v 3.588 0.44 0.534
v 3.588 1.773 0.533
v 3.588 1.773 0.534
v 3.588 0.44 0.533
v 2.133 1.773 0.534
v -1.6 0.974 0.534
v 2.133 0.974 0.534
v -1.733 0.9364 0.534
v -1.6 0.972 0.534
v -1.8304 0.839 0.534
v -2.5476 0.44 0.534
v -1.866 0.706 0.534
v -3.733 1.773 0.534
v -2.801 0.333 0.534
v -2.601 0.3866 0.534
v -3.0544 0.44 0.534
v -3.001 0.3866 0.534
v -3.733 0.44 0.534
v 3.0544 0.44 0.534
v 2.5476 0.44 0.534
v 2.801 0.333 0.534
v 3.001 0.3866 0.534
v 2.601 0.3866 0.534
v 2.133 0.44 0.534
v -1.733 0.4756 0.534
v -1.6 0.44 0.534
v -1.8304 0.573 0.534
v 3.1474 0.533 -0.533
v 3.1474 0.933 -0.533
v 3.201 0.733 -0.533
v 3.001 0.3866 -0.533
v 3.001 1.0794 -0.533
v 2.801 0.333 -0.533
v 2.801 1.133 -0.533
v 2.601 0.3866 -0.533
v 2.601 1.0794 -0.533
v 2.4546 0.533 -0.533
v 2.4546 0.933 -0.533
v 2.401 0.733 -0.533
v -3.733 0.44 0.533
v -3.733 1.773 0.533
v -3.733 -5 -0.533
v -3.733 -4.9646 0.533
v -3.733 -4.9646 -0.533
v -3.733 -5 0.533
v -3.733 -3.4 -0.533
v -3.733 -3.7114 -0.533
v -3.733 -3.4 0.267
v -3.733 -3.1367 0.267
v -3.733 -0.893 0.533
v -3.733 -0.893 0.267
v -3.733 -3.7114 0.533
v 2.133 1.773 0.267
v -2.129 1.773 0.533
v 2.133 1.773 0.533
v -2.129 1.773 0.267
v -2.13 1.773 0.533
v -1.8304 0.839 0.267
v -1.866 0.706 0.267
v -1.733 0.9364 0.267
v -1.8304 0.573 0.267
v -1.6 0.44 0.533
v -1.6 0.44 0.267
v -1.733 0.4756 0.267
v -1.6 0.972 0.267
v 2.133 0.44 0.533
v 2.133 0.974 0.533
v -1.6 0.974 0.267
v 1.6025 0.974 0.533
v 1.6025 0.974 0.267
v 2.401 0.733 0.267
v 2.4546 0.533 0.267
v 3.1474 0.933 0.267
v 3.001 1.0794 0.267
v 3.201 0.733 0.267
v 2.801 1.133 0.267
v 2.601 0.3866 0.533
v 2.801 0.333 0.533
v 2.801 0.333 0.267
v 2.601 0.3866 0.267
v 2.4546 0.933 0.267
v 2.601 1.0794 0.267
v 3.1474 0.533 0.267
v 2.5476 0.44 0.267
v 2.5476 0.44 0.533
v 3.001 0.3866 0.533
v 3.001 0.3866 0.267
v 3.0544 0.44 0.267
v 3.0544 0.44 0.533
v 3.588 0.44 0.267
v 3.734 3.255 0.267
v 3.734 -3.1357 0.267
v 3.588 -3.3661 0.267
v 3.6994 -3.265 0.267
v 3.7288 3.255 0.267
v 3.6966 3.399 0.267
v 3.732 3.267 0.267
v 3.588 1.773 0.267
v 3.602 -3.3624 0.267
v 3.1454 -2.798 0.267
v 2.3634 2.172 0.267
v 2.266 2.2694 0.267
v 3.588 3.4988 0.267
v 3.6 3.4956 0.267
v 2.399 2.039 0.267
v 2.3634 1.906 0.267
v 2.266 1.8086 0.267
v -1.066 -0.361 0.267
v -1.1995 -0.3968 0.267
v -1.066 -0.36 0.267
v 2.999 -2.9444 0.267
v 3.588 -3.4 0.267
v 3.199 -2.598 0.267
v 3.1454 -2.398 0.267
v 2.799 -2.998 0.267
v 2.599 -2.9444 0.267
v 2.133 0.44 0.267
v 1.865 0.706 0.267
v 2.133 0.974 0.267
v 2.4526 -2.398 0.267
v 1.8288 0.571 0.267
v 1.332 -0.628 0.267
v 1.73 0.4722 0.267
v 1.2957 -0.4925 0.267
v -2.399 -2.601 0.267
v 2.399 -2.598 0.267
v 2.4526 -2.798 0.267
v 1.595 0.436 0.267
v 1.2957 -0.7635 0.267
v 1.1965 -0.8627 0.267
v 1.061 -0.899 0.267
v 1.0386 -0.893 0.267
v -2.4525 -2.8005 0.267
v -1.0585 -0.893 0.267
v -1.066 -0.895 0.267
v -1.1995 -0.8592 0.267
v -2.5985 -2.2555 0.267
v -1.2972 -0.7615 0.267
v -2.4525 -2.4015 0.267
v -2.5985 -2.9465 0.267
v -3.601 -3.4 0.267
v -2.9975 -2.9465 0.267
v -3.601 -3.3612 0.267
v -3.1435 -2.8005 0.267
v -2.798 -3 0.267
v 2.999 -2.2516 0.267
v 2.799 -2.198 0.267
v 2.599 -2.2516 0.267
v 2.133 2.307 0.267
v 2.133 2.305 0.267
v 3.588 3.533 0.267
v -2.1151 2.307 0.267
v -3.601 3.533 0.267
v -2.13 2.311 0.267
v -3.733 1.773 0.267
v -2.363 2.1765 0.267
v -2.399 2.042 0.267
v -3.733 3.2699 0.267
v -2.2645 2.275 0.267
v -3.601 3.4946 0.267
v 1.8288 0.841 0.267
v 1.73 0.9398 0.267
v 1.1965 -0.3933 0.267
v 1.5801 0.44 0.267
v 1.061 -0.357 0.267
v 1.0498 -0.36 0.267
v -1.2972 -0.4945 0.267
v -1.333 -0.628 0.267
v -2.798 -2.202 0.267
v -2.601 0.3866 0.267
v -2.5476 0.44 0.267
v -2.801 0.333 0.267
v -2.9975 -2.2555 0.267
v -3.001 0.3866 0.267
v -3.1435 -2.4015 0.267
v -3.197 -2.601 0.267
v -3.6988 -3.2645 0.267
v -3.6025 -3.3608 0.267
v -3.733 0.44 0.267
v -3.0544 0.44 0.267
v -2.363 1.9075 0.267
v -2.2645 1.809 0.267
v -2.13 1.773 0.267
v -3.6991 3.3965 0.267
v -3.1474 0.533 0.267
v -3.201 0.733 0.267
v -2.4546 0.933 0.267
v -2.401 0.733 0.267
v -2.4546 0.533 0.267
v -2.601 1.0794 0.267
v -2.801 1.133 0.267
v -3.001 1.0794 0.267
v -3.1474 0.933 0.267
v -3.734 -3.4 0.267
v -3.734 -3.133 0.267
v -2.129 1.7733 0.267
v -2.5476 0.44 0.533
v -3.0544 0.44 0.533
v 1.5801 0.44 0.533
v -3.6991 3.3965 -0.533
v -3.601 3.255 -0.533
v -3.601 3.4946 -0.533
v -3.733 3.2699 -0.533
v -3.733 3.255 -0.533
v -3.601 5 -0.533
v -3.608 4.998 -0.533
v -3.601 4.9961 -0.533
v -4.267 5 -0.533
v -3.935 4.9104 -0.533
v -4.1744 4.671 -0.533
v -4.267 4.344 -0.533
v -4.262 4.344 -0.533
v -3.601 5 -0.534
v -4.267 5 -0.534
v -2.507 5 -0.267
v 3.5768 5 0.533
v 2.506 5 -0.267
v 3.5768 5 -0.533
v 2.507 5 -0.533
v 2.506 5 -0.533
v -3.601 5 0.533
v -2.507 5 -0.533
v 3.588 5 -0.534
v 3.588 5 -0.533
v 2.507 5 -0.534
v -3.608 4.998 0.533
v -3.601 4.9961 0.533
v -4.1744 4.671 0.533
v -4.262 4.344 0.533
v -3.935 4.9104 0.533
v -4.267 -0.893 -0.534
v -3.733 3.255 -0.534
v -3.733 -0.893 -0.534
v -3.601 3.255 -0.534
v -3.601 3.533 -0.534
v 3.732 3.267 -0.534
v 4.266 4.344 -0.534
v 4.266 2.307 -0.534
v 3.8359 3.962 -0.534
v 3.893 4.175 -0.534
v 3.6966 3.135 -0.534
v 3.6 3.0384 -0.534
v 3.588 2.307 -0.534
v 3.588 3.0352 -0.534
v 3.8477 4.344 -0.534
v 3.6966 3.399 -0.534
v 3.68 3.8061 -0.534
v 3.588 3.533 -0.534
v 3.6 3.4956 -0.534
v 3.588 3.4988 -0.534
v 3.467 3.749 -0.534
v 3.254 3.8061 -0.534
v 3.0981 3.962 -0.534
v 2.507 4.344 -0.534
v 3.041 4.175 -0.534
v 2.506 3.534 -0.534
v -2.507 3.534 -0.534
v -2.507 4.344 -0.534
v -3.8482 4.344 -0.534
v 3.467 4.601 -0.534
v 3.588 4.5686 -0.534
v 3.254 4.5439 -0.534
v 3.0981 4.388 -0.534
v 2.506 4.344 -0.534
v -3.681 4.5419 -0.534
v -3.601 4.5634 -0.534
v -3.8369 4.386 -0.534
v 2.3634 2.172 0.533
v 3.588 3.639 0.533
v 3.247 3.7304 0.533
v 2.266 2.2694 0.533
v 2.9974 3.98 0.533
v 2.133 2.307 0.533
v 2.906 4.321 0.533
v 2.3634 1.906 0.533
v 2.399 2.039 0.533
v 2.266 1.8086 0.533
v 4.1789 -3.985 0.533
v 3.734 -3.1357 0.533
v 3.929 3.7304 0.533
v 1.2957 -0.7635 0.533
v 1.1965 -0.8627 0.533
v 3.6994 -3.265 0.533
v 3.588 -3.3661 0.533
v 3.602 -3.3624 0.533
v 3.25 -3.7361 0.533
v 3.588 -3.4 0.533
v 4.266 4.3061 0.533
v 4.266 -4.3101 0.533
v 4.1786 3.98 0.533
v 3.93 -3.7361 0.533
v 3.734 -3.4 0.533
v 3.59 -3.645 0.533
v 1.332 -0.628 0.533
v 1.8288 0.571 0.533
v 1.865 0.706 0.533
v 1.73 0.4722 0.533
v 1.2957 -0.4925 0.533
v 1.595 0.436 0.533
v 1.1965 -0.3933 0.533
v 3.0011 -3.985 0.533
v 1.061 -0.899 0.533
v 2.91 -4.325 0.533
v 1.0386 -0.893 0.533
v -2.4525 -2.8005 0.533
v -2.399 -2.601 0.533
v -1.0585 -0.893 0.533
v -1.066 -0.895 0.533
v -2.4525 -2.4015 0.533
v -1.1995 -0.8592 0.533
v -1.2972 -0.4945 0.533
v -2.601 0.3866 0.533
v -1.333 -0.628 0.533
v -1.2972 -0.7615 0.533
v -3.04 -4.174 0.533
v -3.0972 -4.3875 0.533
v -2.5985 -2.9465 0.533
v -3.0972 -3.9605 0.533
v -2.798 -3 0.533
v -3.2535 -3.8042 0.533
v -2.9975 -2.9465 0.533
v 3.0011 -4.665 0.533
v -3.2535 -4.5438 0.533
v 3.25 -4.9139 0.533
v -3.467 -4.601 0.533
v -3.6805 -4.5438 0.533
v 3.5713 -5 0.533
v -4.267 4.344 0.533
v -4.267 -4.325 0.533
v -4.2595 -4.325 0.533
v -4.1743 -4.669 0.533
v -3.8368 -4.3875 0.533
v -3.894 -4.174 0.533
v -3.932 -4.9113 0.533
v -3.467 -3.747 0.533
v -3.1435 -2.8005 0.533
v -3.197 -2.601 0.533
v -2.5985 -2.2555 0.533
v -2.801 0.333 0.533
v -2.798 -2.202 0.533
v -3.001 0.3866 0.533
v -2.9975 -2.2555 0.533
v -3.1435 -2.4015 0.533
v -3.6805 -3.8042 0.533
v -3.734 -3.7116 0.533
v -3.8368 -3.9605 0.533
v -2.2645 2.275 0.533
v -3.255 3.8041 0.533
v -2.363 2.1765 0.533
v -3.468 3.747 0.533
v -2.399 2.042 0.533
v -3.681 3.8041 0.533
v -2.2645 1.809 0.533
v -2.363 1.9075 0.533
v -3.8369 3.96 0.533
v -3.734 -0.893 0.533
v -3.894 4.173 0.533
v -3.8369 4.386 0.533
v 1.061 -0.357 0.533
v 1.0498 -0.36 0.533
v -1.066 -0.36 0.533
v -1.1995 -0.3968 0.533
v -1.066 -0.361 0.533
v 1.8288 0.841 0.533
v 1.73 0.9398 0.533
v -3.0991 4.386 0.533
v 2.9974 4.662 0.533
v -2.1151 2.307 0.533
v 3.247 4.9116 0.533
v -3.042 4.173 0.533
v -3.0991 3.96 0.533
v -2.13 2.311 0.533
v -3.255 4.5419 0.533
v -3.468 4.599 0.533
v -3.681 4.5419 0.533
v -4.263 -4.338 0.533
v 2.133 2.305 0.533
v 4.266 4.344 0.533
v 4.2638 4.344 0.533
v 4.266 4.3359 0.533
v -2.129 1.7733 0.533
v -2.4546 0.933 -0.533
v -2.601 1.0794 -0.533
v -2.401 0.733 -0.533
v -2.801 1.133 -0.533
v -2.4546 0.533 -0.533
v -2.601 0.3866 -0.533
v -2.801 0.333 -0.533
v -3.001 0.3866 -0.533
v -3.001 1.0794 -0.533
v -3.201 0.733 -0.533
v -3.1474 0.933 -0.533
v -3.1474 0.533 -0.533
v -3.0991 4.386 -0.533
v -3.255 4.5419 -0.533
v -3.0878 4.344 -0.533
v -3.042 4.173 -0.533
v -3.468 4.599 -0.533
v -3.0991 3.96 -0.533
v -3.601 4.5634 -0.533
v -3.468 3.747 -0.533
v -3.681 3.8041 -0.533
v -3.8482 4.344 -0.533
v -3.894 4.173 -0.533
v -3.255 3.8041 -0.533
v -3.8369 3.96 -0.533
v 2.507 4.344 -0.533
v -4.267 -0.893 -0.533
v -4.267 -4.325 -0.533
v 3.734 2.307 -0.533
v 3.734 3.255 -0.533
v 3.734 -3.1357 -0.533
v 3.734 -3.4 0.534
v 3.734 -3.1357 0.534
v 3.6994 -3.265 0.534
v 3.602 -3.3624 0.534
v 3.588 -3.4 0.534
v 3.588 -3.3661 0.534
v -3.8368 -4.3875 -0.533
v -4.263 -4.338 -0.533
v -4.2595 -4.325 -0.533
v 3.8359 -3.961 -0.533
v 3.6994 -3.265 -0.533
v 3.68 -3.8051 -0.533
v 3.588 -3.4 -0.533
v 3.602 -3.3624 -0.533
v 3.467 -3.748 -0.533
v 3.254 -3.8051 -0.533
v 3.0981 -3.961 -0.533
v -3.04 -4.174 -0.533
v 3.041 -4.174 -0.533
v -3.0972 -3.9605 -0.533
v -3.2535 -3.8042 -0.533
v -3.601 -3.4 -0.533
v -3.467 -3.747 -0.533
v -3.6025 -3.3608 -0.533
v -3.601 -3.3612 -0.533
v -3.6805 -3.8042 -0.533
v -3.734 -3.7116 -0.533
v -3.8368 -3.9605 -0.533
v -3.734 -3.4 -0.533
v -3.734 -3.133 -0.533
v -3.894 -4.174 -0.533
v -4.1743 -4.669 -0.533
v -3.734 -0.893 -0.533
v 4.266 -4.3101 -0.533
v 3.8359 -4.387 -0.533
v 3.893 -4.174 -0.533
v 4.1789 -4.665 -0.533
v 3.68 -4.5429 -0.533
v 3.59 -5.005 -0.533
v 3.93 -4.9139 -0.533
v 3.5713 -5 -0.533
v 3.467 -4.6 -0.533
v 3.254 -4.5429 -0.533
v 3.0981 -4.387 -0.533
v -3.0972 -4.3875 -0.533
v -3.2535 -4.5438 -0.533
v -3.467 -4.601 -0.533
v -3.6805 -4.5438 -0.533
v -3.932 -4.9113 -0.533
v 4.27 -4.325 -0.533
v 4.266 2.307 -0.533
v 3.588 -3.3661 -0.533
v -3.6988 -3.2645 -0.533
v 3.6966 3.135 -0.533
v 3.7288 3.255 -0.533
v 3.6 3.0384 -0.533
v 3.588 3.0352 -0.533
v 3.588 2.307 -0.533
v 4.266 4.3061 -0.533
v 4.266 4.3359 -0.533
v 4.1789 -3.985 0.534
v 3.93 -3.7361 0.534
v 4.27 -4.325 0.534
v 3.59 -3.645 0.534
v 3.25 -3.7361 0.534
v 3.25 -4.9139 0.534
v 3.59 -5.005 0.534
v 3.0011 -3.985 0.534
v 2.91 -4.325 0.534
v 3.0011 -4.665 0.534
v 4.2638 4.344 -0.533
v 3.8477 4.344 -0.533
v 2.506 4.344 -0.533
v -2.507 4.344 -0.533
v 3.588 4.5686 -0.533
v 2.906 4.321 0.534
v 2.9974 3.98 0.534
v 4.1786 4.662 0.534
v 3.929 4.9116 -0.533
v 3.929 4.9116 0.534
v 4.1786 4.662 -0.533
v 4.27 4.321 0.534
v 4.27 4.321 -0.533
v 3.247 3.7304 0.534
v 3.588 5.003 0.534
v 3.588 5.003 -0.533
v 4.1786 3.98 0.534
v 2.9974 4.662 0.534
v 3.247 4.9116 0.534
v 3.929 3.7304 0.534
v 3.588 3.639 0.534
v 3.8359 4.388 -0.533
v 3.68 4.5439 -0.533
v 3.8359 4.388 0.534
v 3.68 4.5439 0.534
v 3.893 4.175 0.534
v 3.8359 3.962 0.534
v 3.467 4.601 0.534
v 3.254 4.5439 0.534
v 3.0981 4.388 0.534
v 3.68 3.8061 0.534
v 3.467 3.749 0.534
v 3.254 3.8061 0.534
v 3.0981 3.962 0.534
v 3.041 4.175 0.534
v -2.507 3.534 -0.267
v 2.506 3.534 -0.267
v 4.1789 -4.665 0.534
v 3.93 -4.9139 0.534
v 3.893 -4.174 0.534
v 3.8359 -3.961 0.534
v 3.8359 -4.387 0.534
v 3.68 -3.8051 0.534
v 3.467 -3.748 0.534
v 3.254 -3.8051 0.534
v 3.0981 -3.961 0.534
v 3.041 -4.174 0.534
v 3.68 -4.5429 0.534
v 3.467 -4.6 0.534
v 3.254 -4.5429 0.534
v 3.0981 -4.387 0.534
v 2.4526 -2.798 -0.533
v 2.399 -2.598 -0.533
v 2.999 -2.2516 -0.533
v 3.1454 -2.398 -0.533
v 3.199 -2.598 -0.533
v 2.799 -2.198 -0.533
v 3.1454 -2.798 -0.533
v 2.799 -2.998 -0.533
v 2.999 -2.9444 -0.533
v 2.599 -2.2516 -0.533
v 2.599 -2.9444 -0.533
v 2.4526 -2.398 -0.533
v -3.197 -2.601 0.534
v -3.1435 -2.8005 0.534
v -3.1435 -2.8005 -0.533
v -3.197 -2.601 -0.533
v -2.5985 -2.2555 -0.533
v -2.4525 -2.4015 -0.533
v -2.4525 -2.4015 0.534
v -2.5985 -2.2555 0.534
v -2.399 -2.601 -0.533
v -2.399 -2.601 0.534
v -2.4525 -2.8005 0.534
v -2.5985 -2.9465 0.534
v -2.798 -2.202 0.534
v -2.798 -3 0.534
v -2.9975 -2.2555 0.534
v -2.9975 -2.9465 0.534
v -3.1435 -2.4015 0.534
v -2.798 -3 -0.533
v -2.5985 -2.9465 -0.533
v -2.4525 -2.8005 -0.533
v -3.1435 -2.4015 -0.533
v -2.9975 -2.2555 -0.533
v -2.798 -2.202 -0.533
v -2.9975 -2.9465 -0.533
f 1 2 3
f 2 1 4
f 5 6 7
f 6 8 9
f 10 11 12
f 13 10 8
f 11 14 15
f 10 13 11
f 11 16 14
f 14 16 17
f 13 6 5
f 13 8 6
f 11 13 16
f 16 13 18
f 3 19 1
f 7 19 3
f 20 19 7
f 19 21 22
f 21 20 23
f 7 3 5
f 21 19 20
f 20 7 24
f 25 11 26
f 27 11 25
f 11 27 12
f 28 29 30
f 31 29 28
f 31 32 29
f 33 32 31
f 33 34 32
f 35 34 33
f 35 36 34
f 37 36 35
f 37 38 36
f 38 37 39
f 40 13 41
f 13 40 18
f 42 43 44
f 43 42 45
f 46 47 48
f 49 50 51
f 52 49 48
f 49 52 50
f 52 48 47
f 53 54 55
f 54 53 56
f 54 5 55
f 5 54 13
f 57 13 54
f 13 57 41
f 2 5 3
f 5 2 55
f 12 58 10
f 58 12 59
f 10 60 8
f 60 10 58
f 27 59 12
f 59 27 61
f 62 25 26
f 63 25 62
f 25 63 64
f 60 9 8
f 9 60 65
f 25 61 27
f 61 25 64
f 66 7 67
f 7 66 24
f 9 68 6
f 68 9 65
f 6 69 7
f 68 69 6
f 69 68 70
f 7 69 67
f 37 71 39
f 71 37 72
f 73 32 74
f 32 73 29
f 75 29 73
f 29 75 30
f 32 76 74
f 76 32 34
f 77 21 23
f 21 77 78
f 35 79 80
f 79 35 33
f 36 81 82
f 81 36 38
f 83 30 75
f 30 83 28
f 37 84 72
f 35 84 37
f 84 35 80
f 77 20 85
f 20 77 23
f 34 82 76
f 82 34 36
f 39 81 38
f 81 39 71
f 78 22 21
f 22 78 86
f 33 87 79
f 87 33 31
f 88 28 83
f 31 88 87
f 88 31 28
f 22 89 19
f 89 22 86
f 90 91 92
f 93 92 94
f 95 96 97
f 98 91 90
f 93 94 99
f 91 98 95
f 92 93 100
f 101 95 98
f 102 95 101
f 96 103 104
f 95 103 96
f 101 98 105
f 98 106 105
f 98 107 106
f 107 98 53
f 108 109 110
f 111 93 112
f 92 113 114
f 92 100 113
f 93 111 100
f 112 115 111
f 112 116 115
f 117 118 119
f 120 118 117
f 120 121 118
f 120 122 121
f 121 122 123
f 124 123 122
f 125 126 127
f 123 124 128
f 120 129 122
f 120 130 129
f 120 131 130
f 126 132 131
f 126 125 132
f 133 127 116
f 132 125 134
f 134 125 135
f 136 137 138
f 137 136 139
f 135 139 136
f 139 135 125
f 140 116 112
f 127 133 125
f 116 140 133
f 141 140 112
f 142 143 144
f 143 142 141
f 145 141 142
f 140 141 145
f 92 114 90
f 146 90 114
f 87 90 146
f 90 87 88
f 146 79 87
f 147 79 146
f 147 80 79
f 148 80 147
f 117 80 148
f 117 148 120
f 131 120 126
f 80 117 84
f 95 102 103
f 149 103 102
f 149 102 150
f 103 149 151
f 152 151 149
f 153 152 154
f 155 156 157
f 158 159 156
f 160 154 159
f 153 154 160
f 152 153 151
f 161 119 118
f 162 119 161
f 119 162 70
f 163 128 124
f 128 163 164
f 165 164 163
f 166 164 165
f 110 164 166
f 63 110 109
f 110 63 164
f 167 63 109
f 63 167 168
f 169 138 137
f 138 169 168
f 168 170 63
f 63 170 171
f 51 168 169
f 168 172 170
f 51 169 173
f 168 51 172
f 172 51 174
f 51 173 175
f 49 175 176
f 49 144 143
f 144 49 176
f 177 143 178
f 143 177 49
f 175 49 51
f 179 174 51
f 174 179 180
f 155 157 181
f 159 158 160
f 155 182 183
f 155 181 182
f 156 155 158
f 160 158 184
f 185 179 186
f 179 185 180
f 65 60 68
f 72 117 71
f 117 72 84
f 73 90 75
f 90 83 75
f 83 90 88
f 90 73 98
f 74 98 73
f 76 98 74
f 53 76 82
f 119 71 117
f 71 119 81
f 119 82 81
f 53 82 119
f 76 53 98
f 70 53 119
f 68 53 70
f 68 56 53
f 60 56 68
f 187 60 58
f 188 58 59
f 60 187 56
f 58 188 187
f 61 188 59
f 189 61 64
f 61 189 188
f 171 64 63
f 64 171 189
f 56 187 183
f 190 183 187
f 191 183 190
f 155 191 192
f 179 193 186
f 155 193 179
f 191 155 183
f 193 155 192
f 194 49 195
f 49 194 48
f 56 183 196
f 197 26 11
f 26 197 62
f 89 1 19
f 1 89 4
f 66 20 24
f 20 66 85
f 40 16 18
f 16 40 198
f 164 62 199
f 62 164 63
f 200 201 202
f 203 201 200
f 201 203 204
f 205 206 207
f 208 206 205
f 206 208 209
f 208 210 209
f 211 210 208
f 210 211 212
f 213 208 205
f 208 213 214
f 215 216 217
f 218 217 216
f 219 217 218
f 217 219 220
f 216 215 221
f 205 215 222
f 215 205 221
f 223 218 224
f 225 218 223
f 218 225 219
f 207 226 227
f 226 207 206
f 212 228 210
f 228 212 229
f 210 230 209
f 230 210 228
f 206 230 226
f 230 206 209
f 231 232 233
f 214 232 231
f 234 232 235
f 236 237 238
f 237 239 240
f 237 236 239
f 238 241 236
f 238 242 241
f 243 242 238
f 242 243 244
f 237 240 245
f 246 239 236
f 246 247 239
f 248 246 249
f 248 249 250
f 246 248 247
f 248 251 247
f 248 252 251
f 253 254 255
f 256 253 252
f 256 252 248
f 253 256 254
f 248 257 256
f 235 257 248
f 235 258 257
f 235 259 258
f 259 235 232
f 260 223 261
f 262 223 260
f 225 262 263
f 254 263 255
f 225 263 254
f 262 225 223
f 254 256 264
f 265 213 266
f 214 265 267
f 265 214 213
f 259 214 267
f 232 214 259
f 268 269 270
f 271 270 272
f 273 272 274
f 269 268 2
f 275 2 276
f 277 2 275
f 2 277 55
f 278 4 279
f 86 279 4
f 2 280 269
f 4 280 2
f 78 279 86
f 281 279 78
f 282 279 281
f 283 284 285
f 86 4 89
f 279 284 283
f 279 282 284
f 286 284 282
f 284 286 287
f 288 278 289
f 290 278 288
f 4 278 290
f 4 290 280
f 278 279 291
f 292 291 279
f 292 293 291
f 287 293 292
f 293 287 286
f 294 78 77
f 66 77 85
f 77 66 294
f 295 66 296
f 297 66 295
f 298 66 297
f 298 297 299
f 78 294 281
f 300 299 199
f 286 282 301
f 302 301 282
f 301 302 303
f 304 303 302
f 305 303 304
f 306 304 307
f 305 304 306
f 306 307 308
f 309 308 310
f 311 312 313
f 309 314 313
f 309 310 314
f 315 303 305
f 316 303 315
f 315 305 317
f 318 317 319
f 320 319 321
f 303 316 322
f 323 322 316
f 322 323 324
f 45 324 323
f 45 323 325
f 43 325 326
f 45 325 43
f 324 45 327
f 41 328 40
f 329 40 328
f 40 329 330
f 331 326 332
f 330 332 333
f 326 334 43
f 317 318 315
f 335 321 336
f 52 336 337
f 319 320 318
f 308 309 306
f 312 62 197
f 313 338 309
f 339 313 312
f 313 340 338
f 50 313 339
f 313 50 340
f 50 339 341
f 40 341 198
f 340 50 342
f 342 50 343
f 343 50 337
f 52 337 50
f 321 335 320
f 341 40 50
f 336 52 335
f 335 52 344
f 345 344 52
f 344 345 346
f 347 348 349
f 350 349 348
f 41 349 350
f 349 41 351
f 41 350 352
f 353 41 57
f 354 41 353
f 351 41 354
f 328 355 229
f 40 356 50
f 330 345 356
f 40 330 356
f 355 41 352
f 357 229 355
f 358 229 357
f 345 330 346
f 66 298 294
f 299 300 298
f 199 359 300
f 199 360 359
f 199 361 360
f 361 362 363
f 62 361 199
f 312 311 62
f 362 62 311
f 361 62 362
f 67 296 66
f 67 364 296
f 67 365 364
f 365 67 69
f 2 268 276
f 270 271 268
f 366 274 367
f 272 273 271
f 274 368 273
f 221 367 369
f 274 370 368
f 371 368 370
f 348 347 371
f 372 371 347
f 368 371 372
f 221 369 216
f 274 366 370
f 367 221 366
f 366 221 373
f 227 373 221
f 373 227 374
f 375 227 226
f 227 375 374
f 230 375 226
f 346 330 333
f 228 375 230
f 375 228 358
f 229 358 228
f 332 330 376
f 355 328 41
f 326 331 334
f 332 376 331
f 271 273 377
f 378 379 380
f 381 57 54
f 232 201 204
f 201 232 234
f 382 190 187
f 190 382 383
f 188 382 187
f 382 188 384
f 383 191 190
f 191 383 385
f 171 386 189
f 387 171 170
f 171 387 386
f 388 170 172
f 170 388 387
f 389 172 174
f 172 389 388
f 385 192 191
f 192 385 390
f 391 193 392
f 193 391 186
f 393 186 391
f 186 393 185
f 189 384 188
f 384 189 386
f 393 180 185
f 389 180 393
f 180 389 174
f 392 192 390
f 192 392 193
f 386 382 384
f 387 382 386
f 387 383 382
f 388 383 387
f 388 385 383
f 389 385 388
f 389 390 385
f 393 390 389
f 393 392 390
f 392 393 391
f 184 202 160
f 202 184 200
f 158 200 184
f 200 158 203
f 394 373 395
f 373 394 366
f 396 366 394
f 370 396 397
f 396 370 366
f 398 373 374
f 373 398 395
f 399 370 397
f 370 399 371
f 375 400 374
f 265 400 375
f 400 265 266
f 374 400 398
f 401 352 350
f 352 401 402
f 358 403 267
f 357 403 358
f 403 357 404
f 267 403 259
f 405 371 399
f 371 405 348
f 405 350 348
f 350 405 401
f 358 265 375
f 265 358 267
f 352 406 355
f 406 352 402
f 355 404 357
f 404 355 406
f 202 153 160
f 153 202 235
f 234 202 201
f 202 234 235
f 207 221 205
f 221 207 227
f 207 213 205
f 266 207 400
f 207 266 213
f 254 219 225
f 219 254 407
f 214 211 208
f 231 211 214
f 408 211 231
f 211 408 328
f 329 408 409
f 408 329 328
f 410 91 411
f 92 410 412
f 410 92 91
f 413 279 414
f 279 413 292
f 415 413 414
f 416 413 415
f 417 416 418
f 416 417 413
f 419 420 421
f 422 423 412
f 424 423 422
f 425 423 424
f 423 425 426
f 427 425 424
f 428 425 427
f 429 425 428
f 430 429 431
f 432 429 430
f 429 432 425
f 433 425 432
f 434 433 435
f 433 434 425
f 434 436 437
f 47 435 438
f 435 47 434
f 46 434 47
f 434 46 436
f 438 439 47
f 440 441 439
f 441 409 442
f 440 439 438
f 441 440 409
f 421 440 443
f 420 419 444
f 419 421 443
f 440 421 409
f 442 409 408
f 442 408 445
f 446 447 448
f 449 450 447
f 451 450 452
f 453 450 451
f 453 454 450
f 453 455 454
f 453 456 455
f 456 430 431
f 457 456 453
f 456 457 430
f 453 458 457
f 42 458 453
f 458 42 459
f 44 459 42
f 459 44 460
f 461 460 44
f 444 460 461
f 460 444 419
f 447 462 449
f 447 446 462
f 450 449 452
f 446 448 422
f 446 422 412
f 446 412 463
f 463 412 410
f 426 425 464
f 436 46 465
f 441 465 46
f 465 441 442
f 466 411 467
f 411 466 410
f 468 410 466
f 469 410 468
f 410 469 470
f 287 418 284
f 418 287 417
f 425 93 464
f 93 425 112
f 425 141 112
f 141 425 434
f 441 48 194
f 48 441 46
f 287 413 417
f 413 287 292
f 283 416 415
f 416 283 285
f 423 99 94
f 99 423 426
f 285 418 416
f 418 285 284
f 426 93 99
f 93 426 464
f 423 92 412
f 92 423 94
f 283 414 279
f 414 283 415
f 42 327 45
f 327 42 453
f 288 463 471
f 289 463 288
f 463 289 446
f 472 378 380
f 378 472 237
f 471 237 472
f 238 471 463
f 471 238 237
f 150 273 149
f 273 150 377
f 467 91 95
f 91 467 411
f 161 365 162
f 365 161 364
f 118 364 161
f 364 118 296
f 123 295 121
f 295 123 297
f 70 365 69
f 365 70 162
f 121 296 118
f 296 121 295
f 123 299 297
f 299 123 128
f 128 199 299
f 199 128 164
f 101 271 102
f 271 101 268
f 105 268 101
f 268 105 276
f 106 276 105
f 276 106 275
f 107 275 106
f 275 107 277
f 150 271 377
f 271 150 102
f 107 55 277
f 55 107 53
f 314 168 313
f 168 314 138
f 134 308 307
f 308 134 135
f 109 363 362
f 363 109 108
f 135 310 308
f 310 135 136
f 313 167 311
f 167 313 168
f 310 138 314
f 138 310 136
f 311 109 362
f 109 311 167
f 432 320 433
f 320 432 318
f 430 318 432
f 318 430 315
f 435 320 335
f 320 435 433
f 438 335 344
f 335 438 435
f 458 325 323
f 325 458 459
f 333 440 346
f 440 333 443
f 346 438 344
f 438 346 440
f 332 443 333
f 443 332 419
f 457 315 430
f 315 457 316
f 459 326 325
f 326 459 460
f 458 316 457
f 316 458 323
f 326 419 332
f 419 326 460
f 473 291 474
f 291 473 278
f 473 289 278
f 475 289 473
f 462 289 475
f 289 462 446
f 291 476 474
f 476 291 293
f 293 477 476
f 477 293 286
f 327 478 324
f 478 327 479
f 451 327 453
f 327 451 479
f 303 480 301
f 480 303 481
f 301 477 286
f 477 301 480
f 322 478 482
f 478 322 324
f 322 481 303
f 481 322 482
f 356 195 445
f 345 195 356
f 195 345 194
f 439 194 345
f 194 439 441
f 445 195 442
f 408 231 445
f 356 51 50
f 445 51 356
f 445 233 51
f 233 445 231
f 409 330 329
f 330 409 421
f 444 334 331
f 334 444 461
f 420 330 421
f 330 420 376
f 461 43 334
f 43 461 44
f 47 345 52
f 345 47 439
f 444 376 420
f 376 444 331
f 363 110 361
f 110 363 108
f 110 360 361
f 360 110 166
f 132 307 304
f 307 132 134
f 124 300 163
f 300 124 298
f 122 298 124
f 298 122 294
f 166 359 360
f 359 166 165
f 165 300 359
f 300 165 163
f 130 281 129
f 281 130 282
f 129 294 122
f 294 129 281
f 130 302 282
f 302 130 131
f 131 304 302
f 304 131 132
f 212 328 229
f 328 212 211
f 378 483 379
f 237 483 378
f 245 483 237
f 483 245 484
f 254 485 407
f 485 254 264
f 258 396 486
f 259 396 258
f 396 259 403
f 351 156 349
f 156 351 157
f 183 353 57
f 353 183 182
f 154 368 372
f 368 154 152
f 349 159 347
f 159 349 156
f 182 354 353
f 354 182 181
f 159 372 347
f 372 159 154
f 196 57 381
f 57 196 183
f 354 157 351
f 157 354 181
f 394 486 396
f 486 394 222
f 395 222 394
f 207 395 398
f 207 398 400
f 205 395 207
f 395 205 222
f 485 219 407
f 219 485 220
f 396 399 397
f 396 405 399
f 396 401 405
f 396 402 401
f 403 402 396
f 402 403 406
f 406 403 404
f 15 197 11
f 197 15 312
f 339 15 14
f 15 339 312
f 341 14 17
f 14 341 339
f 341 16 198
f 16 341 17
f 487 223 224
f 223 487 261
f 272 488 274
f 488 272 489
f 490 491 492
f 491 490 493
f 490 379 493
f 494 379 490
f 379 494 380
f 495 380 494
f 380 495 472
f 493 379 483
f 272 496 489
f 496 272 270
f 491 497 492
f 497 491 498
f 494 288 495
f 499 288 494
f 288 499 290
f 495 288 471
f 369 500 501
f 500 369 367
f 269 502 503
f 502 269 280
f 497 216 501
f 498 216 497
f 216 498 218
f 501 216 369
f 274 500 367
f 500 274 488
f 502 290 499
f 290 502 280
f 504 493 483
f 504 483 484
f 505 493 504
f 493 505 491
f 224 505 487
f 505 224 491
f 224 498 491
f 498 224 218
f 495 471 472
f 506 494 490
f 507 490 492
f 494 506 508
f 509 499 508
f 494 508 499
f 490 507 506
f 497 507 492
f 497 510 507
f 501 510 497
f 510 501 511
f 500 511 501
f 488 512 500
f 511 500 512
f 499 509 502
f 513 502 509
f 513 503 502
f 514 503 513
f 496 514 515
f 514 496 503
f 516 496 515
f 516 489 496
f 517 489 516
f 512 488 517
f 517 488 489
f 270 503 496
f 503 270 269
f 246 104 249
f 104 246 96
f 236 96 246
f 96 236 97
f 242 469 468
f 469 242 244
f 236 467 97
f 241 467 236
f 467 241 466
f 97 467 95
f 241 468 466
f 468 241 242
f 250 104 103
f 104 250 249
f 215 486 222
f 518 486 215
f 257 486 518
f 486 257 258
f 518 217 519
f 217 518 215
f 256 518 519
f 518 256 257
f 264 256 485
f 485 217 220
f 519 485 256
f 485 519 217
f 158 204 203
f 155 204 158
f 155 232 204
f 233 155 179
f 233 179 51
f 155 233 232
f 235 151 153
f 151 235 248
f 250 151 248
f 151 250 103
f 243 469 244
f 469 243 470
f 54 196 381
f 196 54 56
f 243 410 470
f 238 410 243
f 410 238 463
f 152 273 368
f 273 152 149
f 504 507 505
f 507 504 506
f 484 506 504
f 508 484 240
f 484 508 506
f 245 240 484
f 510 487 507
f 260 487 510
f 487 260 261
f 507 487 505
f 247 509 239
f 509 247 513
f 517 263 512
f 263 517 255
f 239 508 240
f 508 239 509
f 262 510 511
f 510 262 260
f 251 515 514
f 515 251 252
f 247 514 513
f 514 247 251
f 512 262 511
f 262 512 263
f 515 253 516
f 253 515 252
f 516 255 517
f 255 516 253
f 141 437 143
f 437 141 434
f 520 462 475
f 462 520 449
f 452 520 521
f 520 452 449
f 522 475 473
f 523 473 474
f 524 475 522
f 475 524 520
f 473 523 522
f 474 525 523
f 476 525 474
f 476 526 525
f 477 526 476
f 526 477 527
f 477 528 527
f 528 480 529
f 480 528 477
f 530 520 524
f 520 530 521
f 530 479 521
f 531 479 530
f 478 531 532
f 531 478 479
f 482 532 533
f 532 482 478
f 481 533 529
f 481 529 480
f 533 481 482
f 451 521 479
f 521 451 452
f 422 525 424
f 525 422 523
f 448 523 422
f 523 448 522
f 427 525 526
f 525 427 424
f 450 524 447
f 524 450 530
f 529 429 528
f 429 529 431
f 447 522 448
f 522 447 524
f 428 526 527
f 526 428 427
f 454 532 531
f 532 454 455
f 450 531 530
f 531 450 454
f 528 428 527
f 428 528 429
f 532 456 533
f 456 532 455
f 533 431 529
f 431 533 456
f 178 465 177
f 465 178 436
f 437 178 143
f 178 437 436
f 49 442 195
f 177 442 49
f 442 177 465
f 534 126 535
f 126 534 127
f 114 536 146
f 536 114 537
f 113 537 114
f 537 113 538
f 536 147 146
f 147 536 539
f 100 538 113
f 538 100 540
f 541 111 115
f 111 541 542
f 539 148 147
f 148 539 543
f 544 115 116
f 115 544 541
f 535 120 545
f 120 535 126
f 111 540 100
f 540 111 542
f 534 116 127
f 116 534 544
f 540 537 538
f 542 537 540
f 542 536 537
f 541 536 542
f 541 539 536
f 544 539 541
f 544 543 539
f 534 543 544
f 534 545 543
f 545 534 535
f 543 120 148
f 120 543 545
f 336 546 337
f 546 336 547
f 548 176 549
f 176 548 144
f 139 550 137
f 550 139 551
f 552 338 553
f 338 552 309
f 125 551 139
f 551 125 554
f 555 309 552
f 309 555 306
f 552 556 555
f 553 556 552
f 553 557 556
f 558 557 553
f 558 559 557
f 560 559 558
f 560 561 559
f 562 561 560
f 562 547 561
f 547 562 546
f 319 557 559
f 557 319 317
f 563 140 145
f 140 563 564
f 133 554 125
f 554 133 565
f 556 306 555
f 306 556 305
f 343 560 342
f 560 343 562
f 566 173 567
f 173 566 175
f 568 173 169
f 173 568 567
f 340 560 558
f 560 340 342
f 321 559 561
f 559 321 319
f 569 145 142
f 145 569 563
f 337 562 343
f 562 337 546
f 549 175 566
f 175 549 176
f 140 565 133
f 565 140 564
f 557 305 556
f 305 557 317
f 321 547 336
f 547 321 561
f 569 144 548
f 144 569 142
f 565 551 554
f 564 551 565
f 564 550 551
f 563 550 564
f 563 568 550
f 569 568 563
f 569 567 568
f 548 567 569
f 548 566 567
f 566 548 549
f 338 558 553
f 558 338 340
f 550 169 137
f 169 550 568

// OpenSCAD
intersection() {
translate([-5.12, -6, -0.64]) cube(size = [10.24, 12, 1.28], center = false);
union() {
intersection() {
difference() {
difference() {
translate([-3.733, -3.4, -0.533]) cube(size = [7.321, 5.173, 1.067], center = false);
translate([-1.6, 0.706, -0.533])
cylinder(h = 1.067, r1 = 0.266, r2 = 0.266, center = false, $fn = 12);
}
union() {
translate([2.133, 2.039, -18.1])
cylinder(h = 36.2, r1 = 0.266, r2 = 0.266, center = false, $fn = 12);
translate([-1.6, -0.893, -0.533]) cube(size = [3.733, 1.867, 1.067], center = false);
}
}
union() {
translate([2.801, 0.733, -18.1])
cylinder(h = 36.2, r1 = 0.4, r2 = 0.4, center = false, $fn = 12);
translate([-3.733, 0.44, 0.267]) cube(size = [4.794, 1.333, 17.833], center = false);
translate([1.061, 0.44, 0.267]) cube(size = [2.527, 1.333, 0.267], center = false);
translate([2.133, 3.255, -0.533]) cube(size = [1.455, 14.845, 1.067], center = false);
}
}
translate([2.799, -2.598, -0.533])
cylinder(h = 0.8, r1 = 0.4, r2 = 0.4, center = false, $fn = 12);
difference() {
rotate([-180, 0, 0])
translate([-4.267, -5, -0.533]) cube(size = [7.855, 5.893, 1.067], center = false);
union() {
translate([-3.454, 3.255, -0.533])
cylinder(h = 0.8, r1 = 0.283, r2 = 0.283, center = false, $fn = 12);
difference() {
rotate([-180, 0, 0])
translate([-18.1, -5, -18.1]) cube(size = [15.97, 1.466, 18.633], center = false);
rotate([0, 0, 0])
translate([-3.608, 4.344, -18.1])
cylinder(h = 36.2, r1 = 0.654, r2 = 0.654, center = false, $fn = 12);
}
translate([-3.468, 4.173, -18.1])
cylinder(h = 36.2, r1 = 0.426, r2 = 0.426, center = false, $fn = 12);
difference() {
rotate([-180, 0, 0])
translate([-18.1, -3.255, -0.533]) cube(size = [36.2, 4.149, 1.067], center = false);
translate([-2.801, 0.733, -0.533])
cylinder(h = 18.633, r1 = 0.4, r2 = 0.4, center = false, $fn = 12);
}
rotate([-180, 0, 0])
translate([-3.601, -18.1, -0.267]) cube(size = [7.189, 14.845, 18.367], center = false);
rotate([-180, 0, 0])
translate([2.507, -18.1, -0.533]) cube(size = [15.593, 14.567, 18.633], center = false);
}
}
translate([-2.798, -2.601, -0.533])
cylinder(h = 1.067, r1 = 0.399, r2 = 0.399, center = false, $fn = 12);
difference() {
translate([3.588, -3.4, -0.533]) cube(size = [0.146, 0.267, 1.067], center = false);
translate([3.469, -3.132, -18.1])
cylinder(h = 36.2, r1 = 0.266, r2 = 0.266, center = false, $fn = 12);
}
intersection() {
difference() {
difference() {
union() {
translate([-18.1, -5, -18.1]) cube(size = [21.688, 6.773, 18.633], center = false);
translate([2.133, -5, -18.1]) cube(size = [2.133, 8.255, 18.633], center = false);
}
translate([1.595, 0.706, -18.1])
cylinder(h = 36.2, r1 = 0.27, r2 = 0.27, center = false, $fn = 12);
}
union() {
translate([2.133, 2.039, 0.267])
cylinder(h = 17.833, r1 = 0.266, r2 = 0.266, center = false, $fn = 12);
translate([-1.066, -0.628, -0.533])
cylinder(h = 18.633, r1 = 0.267, r2 = 0.267, center = false, $fn = 12);
translate([-3.467, -4.174, -18.1])
cylinder(h = 36.2, r1 = 0.427, r2 = 0.427, center = false, $fn = 12);
rotate([0, 0, 0])
translate([3.59, -4.325, -18.1])
cylinder(h = 18.633, r1 = 0.68, r2 = 0.68, center = false, $fn = 12);
}
}
difference() {
union() {
translate([-4.267, -4.325, -0.533]) cube(size = [0.533, 3.432, 1.067], center = false);
translate([-3.733, -5, -0.533]) cube(size = [7.321, 5.44, 1.067], center = false);
rotate([0, 0, 0])
translate([-3.601, -4.338, -0.533])
cylinder(h = 18.633, r1 = 0.662, r2 = 0.662, center = false, $fn = 12);
translate([1.595, -4.325, -0.533]) cube(size = [2.672, 7.581, 1.067], center = false);
}
union() {
translate([-1.066, -0.893, -18.1]) cube(size = [2.127, 0.533, 18.633], center = false);
translate([1.061, -0.628, -18.1])
cylinder(h = 36.2, r1 = 0.271, r2 = 0.271, center = false, $fn = 12);
translate([-3.733, -3.4, -0.533]) cube(size = [7.467, 6.655, 0.8], center = false);
}
}
}
difference() {
union() {
rotate([-180, 0, 0])
translate([-3.601, -5, -0.267]) cube(size = [6.108, 5.893, 0.8], center = false);
translate([-2.801, 0.733, 0.267])
cylinder(h = 0.267, r1 = 0.4, r2 = 0.4, center = false, $fn = 12);
difference() {
rotate([-180, 0, 0])
translate([-4.267, -4.344, -0.533]) cube(size = [8.533, 5.237, 1.067], center = false);
translate([-2.13, 2.042, -18.1])
cylinder(h = 36.2, r1 = 0.269, r2 = 0.269, center = false, $fn = 12);
}
rotate([-180, 0, 0])
translate([2.507, -5, -0.533]) cube(size = [1.081, 5.893, 1.067], center = false);
rotate([-180, 0, 0])
translate([-3.601, -5, -0.533]) cube(size = [1.472, 0.656, 0.267], center = false);
translate([3.588, 4.321, -0.533])
cylinder(h = 1.067, r1 = 0.682, r2 = 0.682, center = false, $fn = 12);
}
union() {
rotate([-180, 0, 0])
translate([-2.507, -5, 0.267]) cube(size = [5.013, 1.466, 17.833], center = false);
rotate([-180, 0, 0])
translate([-3.733, -3.533, -0.267]) cube(size = [7.321, 4.427, 18.367], center = false);
rotate([-180, 0, 0])
translate([-2.129, -2.307, -18.1]) cube(size = [20.229, 20.407, 36.2], center = false);
difference() {
translate([3.468, 3.267, -18.1])
cylinder(h = 18.367, r1 = 0.264, r2 = 0.264, center = false, $fn = 12);
translate([3.588, 4.321, -0.267])
cylinder(h = 18.367, r1 = 0.682, r2 = 0.682, center = false, $fn = 12);
}
translate([3.467, 4.175, -18.1])
cylinder(h = 36.2, r1 = 0.426, r2 = 0.426, center = false, $fn = 12);
translate([-3.468, 4.173, -0.533])
cylinder(h = 18.633, r1 = 0.426, r2 = 0.426, center = false, $fn = 12);
rotate([-180, 0, 0])
translate([-2.507, -3.255, -0.267]) cube(size = [6.773, 0.949, 0.8], center = false);
}
}
difference() {
union() {
translate([-4.267, -3.4, -0.533]) cube(size = [0.666, 0.267, 0.8], center = false);
rotate([0, 0, 0])
translate([3.59, -4.325, -0.533])
cylinder(h = 1.067, r1 = 0.68, r2 = 0.68, center = false, $fn = 12);
}
union() {
translate([3.467, -4.174, -18.1])
cylinder(h = 36.2, r1 = 0.426, r2 = 0.426, center = false, $fn = 12);
translate([-3.471, -3.133, -0.533])
cylinder(h = 18.633, r1 = 0.263, r2 = 0.263, center = false, $fn = 12);
}
}
}
}
